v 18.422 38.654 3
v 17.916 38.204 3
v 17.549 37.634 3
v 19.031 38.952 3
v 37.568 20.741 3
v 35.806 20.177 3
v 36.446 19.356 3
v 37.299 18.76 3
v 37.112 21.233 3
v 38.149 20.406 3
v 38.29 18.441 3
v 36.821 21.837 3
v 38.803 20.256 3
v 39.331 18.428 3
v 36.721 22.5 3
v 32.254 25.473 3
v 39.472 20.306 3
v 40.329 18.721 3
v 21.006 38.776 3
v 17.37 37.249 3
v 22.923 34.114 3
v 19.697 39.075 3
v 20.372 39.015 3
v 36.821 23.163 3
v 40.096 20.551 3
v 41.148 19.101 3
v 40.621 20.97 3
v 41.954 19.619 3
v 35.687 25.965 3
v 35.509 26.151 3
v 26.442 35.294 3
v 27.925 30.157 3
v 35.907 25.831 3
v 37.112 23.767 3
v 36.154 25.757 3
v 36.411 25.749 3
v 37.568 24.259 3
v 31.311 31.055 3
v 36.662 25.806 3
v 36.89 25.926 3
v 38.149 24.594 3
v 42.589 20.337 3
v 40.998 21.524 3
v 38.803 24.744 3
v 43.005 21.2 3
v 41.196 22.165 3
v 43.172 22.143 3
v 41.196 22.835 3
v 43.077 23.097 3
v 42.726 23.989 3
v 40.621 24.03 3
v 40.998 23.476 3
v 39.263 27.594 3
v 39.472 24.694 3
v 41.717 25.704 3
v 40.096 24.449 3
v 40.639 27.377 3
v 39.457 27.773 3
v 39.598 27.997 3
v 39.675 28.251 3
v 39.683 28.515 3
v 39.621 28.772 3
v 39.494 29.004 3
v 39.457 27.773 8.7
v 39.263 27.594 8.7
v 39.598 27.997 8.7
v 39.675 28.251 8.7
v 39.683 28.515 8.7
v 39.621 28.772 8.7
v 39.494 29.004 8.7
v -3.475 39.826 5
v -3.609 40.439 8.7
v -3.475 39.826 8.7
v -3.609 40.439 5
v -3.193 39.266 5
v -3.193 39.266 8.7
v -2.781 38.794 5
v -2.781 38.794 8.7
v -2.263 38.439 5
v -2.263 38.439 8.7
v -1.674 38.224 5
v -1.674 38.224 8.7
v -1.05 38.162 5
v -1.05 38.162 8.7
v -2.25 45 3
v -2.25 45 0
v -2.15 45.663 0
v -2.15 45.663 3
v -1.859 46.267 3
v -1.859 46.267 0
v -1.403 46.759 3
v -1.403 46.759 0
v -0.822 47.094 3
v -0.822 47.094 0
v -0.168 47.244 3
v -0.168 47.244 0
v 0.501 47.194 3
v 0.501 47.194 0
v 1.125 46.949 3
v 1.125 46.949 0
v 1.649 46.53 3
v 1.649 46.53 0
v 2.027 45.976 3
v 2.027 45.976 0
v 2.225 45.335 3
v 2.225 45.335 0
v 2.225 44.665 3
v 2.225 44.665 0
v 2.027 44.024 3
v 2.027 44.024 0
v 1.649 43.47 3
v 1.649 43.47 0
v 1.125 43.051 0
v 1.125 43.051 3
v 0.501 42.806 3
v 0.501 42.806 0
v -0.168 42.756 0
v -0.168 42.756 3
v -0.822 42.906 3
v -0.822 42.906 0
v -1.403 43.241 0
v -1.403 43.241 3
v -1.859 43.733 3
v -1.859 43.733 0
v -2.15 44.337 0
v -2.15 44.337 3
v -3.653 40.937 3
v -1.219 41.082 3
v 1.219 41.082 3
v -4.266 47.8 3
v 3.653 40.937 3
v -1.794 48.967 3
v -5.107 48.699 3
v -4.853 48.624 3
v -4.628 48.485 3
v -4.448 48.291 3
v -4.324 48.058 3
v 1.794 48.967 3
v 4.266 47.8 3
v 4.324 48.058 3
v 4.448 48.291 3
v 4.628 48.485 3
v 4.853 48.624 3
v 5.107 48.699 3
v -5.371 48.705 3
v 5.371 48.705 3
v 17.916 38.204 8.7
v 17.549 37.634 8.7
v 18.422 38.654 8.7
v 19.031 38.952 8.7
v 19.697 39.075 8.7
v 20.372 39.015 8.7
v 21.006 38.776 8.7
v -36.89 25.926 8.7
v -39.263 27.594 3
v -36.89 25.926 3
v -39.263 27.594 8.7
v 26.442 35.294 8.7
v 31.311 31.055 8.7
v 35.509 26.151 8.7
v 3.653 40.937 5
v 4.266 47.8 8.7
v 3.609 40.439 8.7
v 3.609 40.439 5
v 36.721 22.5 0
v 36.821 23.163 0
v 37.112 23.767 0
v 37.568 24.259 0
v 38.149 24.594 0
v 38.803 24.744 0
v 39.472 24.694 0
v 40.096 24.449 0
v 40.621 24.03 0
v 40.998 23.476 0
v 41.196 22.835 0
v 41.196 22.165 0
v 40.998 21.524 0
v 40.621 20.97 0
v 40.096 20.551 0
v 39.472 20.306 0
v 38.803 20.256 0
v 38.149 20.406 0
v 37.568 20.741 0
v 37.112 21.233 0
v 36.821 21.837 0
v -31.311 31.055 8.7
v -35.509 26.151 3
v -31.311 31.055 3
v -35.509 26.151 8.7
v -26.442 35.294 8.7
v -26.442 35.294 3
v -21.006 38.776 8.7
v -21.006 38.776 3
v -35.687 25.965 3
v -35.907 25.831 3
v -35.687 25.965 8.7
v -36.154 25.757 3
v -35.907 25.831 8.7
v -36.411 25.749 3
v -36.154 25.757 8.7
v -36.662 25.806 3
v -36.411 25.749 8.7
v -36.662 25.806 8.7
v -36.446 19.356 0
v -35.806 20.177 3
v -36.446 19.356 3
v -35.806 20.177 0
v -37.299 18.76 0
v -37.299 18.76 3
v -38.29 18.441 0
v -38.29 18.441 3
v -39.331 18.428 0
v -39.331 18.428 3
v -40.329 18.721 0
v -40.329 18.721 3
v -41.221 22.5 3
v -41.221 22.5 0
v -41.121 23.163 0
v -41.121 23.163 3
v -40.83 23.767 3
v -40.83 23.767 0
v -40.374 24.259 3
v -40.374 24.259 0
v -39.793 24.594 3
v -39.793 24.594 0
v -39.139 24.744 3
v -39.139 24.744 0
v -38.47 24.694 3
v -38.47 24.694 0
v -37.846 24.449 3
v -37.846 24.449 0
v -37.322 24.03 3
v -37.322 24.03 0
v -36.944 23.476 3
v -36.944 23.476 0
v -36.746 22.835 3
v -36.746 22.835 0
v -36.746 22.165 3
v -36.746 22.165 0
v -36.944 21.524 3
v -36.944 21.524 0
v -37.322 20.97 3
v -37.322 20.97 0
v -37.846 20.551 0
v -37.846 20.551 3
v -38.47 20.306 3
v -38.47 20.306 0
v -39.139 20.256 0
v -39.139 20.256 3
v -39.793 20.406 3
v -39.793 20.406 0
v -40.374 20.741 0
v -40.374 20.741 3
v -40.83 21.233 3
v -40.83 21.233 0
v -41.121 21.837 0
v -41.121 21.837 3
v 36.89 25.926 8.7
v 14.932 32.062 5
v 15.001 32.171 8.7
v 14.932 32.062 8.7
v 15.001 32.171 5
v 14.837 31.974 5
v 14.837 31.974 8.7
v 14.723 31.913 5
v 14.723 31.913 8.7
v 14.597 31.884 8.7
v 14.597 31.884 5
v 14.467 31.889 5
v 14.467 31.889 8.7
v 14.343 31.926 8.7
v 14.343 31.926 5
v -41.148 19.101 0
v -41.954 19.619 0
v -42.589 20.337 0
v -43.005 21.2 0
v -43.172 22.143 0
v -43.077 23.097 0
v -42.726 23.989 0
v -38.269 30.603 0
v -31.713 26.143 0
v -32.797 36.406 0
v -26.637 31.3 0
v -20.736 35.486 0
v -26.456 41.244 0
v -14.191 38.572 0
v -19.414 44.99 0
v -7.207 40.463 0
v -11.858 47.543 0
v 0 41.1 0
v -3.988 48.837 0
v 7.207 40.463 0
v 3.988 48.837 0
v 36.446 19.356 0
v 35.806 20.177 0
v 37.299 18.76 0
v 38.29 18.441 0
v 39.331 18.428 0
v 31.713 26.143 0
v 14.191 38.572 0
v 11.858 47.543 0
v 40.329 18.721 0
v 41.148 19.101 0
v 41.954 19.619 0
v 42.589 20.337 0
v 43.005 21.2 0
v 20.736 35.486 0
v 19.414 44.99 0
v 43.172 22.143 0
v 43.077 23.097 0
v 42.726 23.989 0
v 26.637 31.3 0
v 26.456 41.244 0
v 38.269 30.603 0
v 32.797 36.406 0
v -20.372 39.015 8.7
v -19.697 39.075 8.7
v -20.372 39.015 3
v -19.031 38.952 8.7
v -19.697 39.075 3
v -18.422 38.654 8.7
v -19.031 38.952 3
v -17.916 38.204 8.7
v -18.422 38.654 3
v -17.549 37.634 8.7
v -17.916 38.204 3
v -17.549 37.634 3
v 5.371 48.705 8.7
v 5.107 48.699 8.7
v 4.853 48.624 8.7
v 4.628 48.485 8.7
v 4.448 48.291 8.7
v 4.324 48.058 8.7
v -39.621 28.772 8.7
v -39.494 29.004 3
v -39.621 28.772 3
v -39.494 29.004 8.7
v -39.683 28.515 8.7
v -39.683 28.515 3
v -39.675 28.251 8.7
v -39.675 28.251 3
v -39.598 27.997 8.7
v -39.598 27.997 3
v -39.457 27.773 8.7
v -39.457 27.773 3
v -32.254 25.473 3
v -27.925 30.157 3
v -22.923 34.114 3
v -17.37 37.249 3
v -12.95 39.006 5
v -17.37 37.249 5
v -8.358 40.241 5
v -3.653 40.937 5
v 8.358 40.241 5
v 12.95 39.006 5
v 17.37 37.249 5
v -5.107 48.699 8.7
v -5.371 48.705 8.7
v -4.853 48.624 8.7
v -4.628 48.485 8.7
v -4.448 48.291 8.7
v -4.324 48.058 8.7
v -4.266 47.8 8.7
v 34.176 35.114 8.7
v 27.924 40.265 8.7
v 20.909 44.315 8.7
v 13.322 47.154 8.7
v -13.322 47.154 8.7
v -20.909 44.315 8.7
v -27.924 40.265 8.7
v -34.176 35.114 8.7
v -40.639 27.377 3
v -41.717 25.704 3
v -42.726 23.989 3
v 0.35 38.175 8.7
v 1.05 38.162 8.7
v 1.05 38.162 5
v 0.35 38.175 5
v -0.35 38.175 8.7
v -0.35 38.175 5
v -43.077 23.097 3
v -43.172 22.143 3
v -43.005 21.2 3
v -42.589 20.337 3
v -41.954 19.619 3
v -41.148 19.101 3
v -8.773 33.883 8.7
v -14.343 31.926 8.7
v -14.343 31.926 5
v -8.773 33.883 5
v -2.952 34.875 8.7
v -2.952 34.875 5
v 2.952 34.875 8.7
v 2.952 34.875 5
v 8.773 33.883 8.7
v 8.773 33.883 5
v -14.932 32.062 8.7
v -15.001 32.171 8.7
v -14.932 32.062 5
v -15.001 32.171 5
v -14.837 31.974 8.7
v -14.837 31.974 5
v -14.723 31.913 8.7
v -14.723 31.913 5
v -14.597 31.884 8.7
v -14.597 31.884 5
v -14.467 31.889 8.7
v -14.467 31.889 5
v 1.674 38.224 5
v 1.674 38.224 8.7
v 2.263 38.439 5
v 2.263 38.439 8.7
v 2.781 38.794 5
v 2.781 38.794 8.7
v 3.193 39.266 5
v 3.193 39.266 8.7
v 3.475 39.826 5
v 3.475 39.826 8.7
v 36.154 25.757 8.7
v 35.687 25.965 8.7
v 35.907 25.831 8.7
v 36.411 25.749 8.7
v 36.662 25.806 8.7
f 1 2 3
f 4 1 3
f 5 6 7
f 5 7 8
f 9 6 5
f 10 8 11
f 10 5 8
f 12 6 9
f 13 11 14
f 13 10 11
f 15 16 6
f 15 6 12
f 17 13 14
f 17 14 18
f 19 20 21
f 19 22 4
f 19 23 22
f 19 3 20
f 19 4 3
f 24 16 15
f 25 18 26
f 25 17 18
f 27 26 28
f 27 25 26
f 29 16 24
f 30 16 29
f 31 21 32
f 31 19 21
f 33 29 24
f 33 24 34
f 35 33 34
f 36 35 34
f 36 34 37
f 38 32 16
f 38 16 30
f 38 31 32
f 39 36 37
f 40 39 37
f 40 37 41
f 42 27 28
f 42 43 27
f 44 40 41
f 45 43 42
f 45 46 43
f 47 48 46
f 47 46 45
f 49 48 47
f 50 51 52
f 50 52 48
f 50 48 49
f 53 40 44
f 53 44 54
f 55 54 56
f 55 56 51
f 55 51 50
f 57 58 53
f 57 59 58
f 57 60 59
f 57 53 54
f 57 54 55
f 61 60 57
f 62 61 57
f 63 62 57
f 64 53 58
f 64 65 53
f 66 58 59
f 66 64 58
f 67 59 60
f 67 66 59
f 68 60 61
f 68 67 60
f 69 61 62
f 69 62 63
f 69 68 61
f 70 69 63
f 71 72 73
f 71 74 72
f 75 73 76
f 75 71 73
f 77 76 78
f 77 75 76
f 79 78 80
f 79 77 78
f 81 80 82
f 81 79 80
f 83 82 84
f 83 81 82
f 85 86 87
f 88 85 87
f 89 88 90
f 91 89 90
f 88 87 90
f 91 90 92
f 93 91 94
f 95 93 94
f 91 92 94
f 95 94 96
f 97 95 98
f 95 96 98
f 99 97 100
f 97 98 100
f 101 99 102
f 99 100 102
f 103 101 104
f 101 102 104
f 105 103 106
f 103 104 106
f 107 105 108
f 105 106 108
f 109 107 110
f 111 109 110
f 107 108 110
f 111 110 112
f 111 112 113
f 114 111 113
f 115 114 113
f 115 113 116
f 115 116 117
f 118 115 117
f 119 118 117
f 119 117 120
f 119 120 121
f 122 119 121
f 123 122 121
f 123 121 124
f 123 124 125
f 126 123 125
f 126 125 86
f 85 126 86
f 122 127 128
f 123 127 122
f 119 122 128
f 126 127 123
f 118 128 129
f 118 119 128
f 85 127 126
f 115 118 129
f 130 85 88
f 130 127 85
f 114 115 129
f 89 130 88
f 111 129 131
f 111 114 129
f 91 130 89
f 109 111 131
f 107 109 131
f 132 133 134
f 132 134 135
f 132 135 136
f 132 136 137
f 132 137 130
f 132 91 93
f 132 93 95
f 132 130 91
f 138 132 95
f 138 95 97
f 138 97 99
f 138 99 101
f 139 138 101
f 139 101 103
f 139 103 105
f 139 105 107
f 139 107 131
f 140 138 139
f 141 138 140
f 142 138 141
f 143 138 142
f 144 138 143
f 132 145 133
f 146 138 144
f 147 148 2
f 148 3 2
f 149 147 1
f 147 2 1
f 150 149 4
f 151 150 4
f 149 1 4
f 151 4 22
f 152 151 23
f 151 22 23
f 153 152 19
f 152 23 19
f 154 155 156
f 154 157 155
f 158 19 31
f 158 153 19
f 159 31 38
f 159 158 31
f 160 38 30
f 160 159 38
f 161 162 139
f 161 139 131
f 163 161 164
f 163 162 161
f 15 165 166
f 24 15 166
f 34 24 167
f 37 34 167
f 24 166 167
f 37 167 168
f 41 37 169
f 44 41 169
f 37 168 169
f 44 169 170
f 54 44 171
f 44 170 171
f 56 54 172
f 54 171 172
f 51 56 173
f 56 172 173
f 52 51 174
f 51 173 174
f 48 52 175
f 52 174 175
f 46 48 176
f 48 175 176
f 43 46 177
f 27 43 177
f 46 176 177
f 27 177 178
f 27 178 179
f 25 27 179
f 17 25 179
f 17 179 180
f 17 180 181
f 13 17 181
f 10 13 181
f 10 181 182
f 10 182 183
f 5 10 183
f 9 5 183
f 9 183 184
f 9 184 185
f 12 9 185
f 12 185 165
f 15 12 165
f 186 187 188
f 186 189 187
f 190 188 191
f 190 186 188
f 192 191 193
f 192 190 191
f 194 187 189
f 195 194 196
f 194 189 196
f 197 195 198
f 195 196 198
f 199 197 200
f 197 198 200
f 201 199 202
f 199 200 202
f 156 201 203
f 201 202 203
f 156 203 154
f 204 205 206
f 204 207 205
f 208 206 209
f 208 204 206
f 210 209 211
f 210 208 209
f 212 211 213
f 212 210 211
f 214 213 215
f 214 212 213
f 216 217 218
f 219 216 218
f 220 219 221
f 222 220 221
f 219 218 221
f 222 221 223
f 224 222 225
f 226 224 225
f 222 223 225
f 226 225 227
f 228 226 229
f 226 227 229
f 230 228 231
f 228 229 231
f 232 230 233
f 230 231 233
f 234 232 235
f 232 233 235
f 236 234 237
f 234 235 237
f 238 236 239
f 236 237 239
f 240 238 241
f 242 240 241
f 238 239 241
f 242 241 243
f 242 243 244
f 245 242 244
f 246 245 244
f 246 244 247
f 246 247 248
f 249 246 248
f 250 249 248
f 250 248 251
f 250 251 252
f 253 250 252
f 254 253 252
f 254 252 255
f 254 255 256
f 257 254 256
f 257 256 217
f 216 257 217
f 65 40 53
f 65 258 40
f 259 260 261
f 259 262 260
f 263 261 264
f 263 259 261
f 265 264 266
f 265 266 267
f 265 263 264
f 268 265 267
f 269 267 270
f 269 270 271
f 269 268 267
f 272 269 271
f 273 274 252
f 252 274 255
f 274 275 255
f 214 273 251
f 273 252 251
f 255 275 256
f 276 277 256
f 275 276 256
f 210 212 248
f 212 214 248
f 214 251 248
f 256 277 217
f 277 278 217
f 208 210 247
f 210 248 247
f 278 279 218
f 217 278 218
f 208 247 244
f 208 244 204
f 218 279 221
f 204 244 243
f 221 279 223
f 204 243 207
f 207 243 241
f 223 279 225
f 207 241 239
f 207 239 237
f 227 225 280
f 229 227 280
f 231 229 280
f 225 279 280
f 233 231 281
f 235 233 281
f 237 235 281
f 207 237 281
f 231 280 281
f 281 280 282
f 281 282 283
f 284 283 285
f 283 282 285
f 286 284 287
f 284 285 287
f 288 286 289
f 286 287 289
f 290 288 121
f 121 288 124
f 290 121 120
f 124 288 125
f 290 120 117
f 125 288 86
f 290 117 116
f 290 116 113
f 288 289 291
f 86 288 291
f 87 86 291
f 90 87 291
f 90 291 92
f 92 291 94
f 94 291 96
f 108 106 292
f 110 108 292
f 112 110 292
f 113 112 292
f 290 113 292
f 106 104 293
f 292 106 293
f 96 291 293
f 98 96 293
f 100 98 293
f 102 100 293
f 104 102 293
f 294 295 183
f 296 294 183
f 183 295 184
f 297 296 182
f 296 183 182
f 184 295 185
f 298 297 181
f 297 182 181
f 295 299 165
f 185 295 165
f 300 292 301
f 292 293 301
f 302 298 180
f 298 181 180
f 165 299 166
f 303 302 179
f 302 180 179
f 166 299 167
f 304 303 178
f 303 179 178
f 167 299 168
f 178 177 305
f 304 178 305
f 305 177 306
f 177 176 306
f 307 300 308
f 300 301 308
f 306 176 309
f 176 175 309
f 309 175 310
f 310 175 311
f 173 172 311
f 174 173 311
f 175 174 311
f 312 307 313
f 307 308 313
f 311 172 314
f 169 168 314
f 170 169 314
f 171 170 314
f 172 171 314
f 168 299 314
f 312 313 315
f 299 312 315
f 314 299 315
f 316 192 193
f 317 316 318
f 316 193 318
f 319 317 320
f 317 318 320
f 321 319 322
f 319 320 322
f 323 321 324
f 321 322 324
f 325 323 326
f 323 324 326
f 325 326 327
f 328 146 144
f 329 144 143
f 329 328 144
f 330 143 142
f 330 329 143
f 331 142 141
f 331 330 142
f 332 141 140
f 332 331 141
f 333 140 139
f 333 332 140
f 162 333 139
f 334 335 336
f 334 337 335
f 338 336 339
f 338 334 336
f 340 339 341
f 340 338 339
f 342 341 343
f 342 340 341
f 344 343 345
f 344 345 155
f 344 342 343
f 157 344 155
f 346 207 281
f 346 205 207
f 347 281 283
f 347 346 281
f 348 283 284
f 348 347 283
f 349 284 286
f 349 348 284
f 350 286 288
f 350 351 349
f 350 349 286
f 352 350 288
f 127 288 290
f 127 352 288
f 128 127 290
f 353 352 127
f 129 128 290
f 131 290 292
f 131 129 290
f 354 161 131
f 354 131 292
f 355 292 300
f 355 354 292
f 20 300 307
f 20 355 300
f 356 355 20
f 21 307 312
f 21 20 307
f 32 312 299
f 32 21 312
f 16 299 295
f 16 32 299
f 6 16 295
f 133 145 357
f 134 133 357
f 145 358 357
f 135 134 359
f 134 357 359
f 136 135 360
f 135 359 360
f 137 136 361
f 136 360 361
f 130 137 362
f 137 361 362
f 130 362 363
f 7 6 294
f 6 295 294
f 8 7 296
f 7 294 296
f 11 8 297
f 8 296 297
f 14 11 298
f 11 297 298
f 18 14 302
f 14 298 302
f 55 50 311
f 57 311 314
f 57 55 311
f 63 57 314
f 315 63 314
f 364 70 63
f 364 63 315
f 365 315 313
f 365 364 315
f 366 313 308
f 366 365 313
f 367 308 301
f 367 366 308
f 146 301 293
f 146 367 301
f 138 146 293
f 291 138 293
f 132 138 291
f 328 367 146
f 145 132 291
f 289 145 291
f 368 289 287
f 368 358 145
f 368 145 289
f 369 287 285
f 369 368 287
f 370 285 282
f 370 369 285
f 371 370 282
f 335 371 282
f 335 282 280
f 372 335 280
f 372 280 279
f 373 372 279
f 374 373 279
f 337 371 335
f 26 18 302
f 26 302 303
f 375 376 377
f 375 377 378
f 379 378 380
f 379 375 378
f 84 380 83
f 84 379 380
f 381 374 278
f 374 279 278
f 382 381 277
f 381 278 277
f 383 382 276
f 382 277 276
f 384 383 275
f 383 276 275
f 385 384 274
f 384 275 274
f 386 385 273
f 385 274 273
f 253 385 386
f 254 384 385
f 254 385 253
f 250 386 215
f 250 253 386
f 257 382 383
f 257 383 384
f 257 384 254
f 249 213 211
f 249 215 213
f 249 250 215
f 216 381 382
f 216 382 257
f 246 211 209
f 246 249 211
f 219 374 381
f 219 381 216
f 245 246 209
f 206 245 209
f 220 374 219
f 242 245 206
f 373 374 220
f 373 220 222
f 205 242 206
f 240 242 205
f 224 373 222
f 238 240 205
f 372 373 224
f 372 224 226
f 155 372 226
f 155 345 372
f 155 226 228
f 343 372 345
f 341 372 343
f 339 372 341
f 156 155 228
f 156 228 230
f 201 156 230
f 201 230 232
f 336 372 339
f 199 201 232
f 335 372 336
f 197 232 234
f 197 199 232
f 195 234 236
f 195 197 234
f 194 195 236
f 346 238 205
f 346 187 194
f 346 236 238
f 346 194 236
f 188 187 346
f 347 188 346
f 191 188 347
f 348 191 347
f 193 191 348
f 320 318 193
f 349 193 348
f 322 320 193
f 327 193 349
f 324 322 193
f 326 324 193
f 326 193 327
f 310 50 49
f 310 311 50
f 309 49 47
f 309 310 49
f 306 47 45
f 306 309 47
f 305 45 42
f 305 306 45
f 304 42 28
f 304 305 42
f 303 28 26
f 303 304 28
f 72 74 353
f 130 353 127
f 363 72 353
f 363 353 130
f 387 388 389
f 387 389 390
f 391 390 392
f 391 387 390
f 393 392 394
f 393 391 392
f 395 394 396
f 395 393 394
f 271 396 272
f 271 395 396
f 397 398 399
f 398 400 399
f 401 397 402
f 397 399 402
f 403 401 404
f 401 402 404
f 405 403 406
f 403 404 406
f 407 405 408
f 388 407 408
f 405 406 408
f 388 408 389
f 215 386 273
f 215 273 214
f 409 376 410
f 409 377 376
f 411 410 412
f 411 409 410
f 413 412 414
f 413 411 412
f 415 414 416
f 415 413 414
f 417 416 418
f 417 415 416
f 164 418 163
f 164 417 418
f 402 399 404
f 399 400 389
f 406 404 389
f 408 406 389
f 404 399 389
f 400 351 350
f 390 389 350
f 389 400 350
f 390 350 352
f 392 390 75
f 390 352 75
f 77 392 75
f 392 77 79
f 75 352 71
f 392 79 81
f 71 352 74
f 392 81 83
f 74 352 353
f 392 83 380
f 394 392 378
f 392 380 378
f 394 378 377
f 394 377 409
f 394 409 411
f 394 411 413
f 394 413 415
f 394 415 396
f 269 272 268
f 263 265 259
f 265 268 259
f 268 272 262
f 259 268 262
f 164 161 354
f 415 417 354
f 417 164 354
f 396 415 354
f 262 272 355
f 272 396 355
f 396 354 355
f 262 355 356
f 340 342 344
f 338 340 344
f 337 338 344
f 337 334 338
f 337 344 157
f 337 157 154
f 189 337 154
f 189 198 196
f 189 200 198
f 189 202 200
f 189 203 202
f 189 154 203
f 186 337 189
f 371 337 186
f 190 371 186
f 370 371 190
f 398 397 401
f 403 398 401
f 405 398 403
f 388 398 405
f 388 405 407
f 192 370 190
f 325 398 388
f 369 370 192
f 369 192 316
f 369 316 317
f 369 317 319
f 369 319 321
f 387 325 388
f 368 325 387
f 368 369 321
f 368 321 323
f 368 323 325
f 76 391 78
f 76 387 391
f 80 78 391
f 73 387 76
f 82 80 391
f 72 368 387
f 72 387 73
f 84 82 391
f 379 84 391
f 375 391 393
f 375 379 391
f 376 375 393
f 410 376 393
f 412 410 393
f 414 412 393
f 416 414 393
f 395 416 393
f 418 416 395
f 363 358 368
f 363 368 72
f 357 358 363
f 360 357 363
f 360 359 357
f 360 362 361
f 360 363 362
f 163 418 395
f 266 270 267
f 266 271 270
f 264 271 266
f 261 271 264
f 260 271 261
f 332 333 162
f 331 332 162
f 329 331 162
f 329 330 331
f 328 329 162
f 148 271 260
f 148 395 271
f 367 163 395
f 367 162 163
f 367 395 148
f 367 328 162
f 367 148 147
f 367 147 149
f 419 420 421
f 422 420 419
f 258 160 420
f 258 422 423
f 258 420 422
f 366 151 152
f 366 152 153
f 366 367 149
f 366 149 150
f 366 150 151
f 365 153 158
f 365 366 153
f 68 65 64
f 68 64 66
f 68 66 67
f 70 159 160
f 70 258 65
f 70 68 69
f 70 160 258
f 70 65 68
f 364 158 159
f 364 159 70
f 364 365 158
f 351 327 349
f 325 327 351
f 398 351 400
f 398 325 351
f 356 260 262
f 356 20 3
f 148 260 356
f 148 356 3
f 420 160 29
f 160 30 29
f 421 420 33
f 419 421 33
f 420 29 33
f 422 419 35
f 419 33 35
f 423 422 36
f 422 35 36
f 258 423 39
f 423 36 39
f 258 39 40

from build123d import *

# Parameters (mm, degrees)
EXTRUDE_1_DEPTH         = 3.699999999999999
EXTRUDE_2_DEPTH         = 2
EXTRUDE_3_DEPTH         = 2
EXTRUDE_4_DEPTH         = 2.9999999999999996
HOLE_WIZARD_4_5_4_5_1_D = 4.5
FILLET_1_R              = 0.5
FILLET_2_R              = 1
FILLET_3_R              = 2.5
FILLET_4_R              = 3.5


with BuildPart() as part:
    # 草图1 → 凸台-拉伸1 (new body)
    with BuildSketch(Plane.XY.offset(8.7)):
        with BuildLine():
            Line((14.79163916092453, 31.720772546282735), (18.637465342764905, 39.96817340831624))
            ThreePointArc((18.637465342764905, 39.96817340831624), (28.317533729903538, 33.807207566668026), (36.080540216984, 25.357535717230103))
            Line((36.080540216984, 25.357535717230103), (40.08948912998223, 28.17503968581122))
            ThreePointArc((40.08948912998223, 28.17503968581122), (24.49999999999949, 42.435244785437796), (4.3555555555549486, 48.80603585421044))
            Line((4.3555555555549486, 48.80603585421044), (3.3935020106793496, 38.025776205131926))
            ThreePointArc((3.3935020106793496, 38.025776205131926), (-2.3395e-13, 38.176897620148004), (-3.3935020106798226, 38.02577620513189))
            Line((-3.3935020106798226, 38.02577620513189), (-4.355555555555555, 48.80603585421038))
            ThreePointArc((-4.355555555555555, 48.80603585421038), (-24.50000000000001, 42.43524478543748), (-40.0894891299826, 28.17503968581074))
            Line((-40.0894891299826, 28.17503968581074), (-36.08054021698431, 25.357535717229652))
            ThreePointArc((-36.08054021698431, 25.357535717229652), (-28.317533729903744, 33.80720756666784), (-18.637465342764894, 39.96817340831625))
            Line((-18.637465342764894, 39.96817340831625), (-14.791639160924516, 31.720772546282742))
            ThreePointArc((-14.791639160924516, 31.720772546282742), (3.21e-15, 35.00000000000001), (14.79163916092453, 31.720772546282735))
        make_face()
    extrude(amount=-EXTRUDE_1_DEPTH)

    # 草图2 → 凸台-拉伸2 (add)
    with BuildSketch(Plane(origin=(0, 0, 5.000000000000001), x_dir=(-1, 0, 0), z_dir=(0, 0, -1))):
        with BuildLine():
            Line((-36.080540216984, 25.357535717230096), (-40.089489129982226, 28.175039685811218))
            ThreePointArc((-40.089489129982226, 28.175039685811218), (-24.499999999998106, 42.435244785438584), (-4.355555555551784, 48.806035854210705))
            Line((-4.355555555551784, 48.806035854210705), (-3.6533333333301714, 40.93730762465429))
            ThreePointArc((-3.6533333333301714, 40.93730762465429), (-10.67199534451459, 39.690282379527844), (-17.3696105575428, 37.249250047206296))
            Line((-17.3696105575428, 37.249250047206296), (-18.63746534276491, 39.96817340831625))
            ThreePointArc((-18.63746534276491, 39.96817340831625), (-28.317533729903555, 33.80720756666802), (-36.080540216984, 25.357535717230096))
        make_face()
    extrude(amount=EXTRUDE_2_DEPTH)

    # 草图3 → 凸台-拉伸3 (add)
    with BuildSketch(Plane(origin=(0, 0, 5.000000000000001), x_dir=(-1, 0, 0), z_dir=(0, 0, -1))):
        with BuildLine():
            Line((3.6533333333333347, 40.937307624654004), (4.355555555555555, 48.80603585421038))
            ThreePointArc((4.355555555555555, 48.80603585421038), (24.500000000000018, 42.43524478543748), (40.089489129982574, 28.175039685810727))
            Line((40.089489129982574, 28.175039685810727), (36.08054021698431, 25.357535717229652))
            ThreePointArc((36.08054021698431, 25.357535717229652), (28.317533729903737, 33.80720756666785), (18.637465342764894, 39.96817340831625))
            Line((18.637465342764894, 39.96817340831625), (17.369610557542792, 37.24925004720629))
            ThreePointArc((17.369610557542792, 37.24925004720629), (10.671995344516127, 39.69028237952743), (3.6533333333333347, 40.937307624654004))
        make_face()
    extrude(amount=EXTRUDE_3_DEPTH)

    # 草图4 → 凸台-拉伸4 (add)
    with BuildSketch(Plane.XY.offset(3)):
        with BuildLine():
            Line((-44.44504468553815, 20.63099616839955), (-37.27941503215546, 17.304774337167785))
            ThreePointArc((-37.27941503215546, 17.304774337167785), (-2.4282e-13, 41.099999999999994), (37.27941503215526, 17.304774337168233))
            Line((37.27941503215526, 17.304774337168233), (44.44504468553791, 20.630996168400085))
            ThreePointArc((44.44504468553791, 20.630996168400085), (-2.897e-13, 49.00000000000001), (-44.44504468553815, 20.63099616839955))
        make_face()
    extrude(amount=-EXTRUDE_4_DEPTH)

    # Ø4.5 (4.5) 直径孔1 (through all)
    with Locations(Plane.XY.offset(3)):
        with Locations((-38.97114317, 22.5), (38.97114317, 22.5), (0, 45)):
            Hole(HOLE_WIZARD_4_5_4_5_1_D / 2)

    # 圆角1
    fillet_1_edges = [part.edges().sort_by_distance(p)[0] for p in [
        (-14.791639160924518, 31.720772546282745, 6.85),
        (14.791639160924529, 31.72077254628274, 6.85),
    ]]
    fillet(fillet_1_edges, radius=FILLET_1_R)

    # 圆角2
    fillet_2_edges = [part.edges().sort_by_distance(p)[0] for p in [
        (-36.08054021698432, 25.357535717229656, 5.85),
        (-40.089489129982596, 28.175039685810734, 5.85),
        (-4.355555555555555, 48.80603585421038, 5.85),
        (4.3555555555533685, 48.80603585421058, 5.85),
        (40.08948912998223, 28.17503968581122, 5.85),
        (36.080540216984, 25.357535717230103, 5.85),
    ]]
    fillet(fillet_2_edges, radius=FILLET_2_R)

    # 圆角3
    fillet_3_edges = [part.edges().sort_by_distance(p)[0] for p in [
        (-18.637465342764898, 39.96817340831625, 5.85),
        (-3.3935020106798235, 38.02577620513189, 6.85),
        (3.3935020106793496, 38.02577620513193, 6.85),
        (18.637465342764905, 39.96817340831625, 5.85),
    ]]
    fillet(fillet_3_edges, radius=FILLET_3_R)

    # 圆角4
    fillet_4_edges = [part.edges().sort_by_distance(p)[0] for p in [
        (-44.44504468553815, 20.630996168399555, 1.5000000000000002),
        (44.44504468553791, 20.630996168400085, 1.5000000000000002),
        (37.27941503215526, 17.30477433716824, 1.5000000000000002),
        (-37.27941503215546, 17.304774337167785, 1.5000000000000002),
    ]]
    fillet(fillet_4_edges, radius=FILLET_4_R)


solid = part.part
